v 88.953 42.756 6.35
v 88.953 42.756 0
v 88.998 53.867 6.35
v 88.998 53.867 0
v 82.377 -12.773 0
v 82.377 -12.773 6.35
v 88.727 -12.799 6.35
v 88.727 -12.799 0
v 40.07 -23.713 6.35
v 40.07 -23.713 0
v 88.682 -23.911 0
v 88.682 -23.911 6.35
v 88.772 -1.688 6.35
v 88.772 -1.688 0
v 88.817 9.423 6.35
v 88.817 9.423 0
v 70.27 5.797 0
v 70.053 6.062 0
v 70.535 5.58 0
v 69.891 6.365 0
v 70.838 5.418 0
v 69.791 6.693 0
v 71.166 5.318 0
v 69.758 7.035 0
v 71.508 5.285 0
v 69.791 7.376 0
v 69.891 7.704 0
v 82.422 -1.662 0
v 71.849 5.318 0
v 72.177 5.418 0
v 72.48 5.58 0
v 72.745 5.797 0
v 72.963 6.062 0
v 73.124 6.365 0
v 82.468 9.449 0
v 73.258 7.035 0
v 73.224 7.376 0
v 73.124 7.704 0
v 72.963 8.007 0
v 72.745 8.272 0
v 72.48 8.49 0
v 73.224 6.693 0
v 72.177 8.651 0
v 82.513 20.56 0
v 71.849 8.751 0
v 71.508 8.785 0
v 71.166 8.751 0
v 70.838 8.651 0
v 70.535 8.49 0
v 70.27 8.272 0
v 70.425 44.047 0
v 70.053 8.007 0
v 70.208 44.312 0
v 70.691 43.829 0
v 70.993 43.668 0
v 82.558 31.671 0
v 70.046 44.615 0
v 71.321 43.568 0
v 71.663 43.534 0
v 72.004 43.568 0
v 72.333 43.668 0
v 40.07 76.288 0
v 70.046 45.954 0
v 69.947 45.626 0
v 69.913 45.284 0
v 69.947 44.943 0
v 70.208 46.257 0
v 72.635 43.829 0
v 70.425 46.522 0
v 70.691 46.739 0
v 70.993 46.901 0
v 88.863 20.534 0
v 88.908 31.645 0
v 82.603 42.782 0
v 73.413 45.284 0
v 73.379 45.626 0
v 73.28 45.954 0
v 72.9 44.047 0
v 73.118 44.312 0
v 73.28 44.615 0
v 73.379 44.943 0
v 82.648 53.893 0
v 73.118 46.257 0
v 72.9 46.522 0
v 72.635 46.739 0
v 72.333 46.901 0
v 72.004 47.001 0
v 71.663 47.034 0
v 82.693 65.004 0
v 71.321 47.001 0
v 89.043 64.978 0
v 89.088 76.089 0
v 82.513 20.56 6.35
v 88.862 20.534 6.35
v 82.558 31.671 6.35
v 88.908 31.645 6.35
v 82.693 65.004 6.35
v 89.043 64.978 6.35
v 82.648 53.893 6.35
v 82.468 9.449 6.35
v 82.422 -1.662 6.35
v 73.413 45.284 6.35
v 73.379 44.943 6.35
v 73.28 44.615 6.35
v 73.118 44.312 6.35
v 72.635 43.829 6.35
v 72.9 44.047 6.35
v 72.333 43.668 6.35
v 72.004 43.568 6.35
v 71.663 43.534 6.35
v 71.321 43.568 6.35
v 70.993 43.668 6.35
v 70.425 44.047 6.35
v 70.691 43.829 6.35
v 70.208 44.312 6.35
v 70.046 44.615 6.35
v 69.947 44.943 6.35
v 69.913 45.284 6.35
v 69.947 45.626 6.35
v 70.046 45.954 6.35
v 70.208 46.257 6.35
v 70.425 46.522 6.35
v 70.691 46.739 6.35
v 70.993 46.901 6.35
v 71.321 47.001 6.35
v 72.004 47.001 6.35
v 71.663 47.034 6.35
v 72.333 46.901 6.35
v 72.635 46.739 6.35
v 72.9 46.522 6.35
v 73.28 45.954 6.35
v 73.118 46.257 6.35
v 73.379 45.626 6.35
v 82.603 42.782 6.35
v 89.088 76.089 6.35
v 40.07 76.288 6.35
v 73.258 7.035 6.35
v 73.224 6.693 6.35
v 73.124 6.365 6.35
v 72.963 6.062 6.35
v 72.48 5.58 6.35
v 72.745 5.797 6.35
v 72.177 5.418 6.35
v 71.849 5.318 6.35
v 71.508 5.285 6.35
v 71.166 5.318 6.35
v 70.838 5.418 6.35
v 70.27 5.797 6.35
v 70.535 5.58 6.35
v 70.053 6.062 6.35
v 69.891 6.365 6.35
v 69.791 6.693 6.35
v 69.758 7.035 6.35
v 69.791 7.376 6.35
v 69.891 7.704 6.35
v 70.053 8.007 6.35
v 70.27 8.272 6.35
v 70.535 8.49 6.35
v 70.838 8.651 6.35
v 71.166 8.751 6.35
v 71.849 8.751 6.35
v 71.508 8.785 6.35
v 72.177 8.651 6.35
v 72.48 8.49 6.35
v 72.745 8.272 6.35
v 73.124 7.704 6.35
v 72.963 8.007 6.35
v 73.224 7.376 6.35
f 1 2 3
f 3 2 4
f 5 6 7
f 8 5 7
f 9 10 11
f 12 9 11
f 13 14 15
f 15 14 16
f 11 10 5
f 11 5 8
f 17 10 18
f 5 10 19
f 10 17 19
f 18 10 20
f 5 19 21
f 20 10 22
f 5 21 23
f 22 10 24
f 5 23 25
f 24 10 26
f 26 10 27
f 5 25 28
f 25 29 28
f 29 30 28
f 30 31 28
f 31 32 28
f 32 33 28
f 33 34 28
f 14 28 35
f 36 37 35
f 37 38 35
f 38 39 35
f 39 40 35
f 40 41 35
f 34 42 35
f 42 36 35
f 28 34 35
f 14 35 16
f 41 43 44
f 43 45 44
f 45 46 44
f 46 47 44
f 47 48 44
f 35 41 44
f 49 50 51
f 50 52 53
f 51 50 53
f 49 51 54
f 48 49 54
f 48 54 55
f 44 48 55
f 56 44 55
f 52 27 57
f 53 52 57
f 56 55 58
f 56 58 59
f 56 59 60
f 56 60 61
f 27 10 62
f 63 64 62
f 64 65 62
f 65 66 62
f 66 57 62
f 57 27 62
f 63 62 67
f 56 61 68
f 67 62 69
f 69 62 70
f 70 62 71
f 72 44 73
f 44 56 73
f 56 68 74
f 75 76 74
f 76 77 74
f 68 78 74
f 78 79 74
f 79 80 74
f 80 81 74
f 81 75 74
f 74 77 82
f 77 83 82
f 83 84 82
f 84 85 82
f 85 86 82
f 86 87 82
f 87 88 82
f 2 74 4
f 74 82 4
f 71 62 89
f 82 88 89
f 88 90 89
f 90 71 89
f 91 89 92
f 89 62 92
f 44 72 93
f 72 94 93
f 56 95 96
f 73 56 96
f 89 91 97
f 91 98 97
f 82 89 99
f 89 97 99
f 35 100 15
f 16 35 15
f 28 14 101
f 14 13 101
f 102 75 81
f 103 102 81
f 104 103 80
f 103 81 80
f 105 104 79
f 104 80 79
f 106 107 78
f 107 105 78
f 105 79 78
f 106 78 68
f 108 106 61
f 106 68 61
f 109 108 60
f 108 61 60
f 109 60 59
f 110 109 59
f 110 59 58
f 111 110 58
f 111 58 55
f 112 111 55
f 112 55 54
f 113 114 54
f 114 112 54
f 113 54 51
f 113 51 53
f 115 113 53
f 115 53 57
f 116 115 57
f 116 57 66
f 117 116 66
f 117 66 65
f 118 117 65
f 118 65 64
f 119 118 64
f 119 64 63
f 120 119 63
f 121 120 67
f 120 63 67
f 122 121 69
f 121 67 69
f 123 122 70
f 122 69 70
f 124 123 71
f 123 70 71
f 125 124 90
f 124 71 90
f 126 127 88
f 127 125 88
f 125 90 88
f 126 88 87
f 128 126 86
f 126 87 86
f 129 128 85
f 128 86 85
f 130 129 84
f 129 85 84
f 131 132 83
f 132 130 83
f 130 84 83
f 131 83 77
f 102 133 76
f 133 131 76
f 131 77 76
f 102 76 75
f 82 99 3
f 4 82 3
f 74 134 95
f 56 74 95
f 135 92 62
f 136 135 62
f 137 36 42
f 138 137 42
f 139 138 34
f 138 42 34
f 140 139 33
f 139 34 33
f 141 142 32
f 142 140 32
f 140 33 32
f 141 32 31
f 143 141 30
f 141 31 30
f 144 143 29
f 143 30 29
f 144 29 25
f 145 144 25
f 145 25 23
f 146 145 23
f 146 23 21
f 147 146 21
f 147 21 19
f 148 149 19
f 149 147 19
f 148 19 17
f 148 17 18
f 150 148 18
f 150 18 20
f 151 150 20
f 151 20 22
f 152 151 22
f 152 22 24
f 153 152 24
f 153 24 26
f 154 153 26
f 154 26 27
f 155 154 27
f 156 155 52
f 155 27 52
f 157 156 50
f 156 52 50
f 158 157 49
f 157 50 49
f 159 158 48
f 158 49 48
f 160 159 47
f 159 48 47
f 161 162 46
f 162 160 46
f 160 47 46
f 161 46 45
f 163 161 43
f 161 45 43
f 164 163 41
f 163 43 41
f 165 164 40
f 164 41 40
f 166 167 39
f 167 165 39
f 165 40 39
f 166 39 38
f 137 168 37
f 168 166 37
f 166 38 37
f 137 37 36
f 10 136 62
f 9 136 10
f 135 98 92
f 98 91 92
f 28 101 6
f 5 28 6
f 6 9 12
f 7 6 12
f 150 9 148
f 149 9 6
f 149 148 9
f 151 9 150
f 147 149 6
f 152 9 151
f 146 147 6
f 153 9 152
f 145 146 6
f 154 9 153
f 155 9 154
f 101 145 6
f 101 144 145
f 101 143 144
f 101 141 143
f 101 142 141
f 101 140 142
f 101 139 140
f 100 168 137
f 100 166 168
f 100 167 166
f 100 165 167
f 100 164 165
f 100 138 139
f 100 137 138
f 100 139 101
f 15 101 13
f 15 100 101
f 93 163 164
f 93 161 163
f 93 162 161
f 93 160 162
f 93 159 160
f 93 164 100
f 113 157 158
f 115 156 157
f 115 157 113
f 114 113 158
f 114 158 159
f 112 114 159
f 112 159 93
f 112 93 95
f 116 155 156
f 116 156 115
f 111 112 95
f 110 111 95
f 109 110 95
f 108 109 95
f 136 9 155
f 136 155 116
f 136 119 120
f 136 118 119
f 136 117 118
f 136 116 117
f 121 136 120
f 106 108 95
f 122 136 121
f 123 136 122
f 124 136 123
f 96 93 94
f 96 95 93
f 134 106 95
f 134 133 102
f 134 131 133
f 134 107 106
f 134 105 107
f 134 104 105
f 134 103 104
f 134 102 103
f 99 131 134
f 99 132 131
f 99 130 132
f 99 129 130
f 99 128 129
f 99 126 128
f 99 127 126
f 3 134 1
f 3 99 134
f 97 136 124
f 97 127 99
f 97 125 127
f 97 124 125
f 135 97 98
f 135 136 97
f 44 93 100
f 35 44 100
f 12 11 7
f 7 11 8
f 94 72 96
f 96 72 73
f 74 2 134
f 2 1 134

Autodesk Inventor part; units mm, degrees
ref_plane "YZ Plane" through (0, 0, 0) normal (1, 0, 0) x (0, 1, 0)
ref_plane "XZ Plane" through (0, 0, 0) normal (0, 1, 0) x (-1, 0, 0)
ref_plane "XY Plane" through (0, 0, 0) normal (0, 0, 1) x (1, 0, 0)
sketch "Sketch1" plane through (0, 0, 0) normal (0, 0, 1) x (1, 0, 0)
  line L0 (-5.2979, -23.5291) -> (88.6821, -23.9107)
  line L1 (88.6821, -23.9107) -> (89.0881, 76.0893)
  line L2 (89.0881, 76.0893) -> (-4.8919, 76.4709)
  line L3 (-4.8919, 76.4709) -> (-5.2979, -23.5291)
  line L4 (-5.2979, -23.5291) -> (2.9514, -23.54) construction
  circle A0 centre (26.5572, 26.3424) radius 11 construction
  circle A1 centre (41.9941, 10.7796) radius 1.5 construction
  circle A2 centre (10.9944, 10.9055) radius 1.5 construction
  circle A3 centre (11.1202, 41.9052) radius 1.5 construction
  circle A4 centre (42.12, 41.7793) radius 1.5 construction
  circle A5 centre (0.2148, 52.8996) radius 1.4224 construction
  circle A6 centre (0, 0) radius 1.4224 construction
  circle A7 centre (52.8996, -0.2148) radius 1.4224 construction
  circle A8 centre (53.1143, 52.6848) radius 1.4224 construction
  line L5 (-5.3215, -5.2784) -> (58.178, -5.5363) construction
  line L6 (58.178, -5.5363) -> (58.4358, 57.9632) construction
  line L7 (58.4358, 57.9632) -> (-5.0637, 58.221) construction
  line L8 (-5.0637, 58.221) -> (-5.3215, -5.2784) construction
  line L9 (63.369, -2.4573) -> (82.4189, -2.5346) construction
  circle A9 centre (71.5076, 7.0347) radius 1.75
  circle A10 centre (71.6629, 45.2844) radius 1.75
  circle A11 centre (71.6629, 45.2844) radius 1.75 construction
  circle A12 centre (71.5076, 7.0347) radius 1.75 construction
  point P0 (88.9156, 66.1637)
  dimension "d7" = 100
  dimension "d8" = 93.98
  dimension "d38" = 3.5
extrude "Extrusion1" add sketch "Sketch1" along normal blind 6.35
sketch "Sketch2" plane through (0, 0, 6.35) normal (0, 0, 1) x (1, 0, 0)
  circle A0 centre (0.0605, -0.0094) radius 1.4214 construction
  circle A1 centre (52.924, -0.224) radius 1.4214 construction
  circle A2 centre (53.1386, 52.6394) radius 1.4214 construction
  circle A3 centre (0.2751, 52.8541) radius 1.4214 construction
  line L0 (-5.2979, -23.5291) -> (88.6821, -23.9107) construction
  line L1 (89.0881, 76.0893) -> (-4.8919, 76.4709) construction
  line L2 (-4.8919, 76.4709) -> (-5.2979, -23.5291) construction
  line L3 (89.0881, 76.0893) -> (89.043, 64.9782)
  line L4 (89.043, 64.9782) -> (82.693, 65.004)
  line L5 (82.693, 65.004) -> (82.6479, 53.8929)
  line L6 (82.6479, 53.8929) -> (88.9978, 53.8671)
  line L7 (89.043, 64.9782) -> (88.9978, 53.8671)
  line L8 (88.9979, 53.8673) -> (88.9527, 42.7562)
  line L9 (88.9527, 42.7562) -> (82.6028, 42.782)
  line L10 (82.6028, 42.782) -> (82.5577, 31.6709)
  line L11 (82.5577, 31.6709) -> (88.9076, 31.6451)
  line L12 (88.9527, 42.7562) -> (88.9076, 31.6451)
  line L13 (88.9076, 31.6453) -> (88.8625, 20.5341)
  line L14 (88.8625, 20.5341) -> (82.5126, 20.5599)
  line L15 (82.5126, 20.5599) -> (82.4675, 9.4488)
  line L16 (82.4675, 9.4488) -> (88.8174, 9.423)
  line L17 (88.8625, 20.5341) -> (88.8174, 9.423)
  line L18 (88.8174, 9.4232) -> (88.7723, -1.6879)
  line L19 (88.7723, -1.6879) -> (82.4223, -1.6621)
  line L20 (82.4223, -1.6621) -> (82.3772, -12.7732)
  line L21 (82.3772, -12.7732) -> (88.7272, -12.799)
  line L22 (88.7723, -1.6879) -> (88.7272, -12.799)
  point P0 (0, 0)
  dimension "d12" = 6.35
  dimension "d14" = 11.1111
  dimension "d31" = 22.2222
extrude "Extrusion2" cut sketch "Sketch2" against normal blind 25.4
sketch "Sketch3" plane through (0, 0, 6.35) normal (0, 0, 1) x (1, 0, 0)
  line L0 (89.0881, 76.0893) -> (-4.8919, 76.4709) construction
  line L1 (-4.8919, 76.4709) -> (-5.2979, -23.5291) construction
  line L2 (-5.2979, -23.5291) -> (88.6821, -23.9107) construction
  line L3 (89.0881, 76.0893) -> (-4.8919, 76.4709) projected
  line L4 (40.0695, 76.2884) -> (40.0695, -23.7133)
  line L5 (-5.2979, -23.5291) -> (88.6821, -23.9107) projected
  line L6 (-4.8919, 76.4709) -> (-5.2979, -23.5291)
  point P0 (0, 0)
extrude "Extrusion3" cut sketch "Sketch3" against normal blind 25.4
equation "\"d14\" = d11"
equation "\"d11\" = 11.111111"
